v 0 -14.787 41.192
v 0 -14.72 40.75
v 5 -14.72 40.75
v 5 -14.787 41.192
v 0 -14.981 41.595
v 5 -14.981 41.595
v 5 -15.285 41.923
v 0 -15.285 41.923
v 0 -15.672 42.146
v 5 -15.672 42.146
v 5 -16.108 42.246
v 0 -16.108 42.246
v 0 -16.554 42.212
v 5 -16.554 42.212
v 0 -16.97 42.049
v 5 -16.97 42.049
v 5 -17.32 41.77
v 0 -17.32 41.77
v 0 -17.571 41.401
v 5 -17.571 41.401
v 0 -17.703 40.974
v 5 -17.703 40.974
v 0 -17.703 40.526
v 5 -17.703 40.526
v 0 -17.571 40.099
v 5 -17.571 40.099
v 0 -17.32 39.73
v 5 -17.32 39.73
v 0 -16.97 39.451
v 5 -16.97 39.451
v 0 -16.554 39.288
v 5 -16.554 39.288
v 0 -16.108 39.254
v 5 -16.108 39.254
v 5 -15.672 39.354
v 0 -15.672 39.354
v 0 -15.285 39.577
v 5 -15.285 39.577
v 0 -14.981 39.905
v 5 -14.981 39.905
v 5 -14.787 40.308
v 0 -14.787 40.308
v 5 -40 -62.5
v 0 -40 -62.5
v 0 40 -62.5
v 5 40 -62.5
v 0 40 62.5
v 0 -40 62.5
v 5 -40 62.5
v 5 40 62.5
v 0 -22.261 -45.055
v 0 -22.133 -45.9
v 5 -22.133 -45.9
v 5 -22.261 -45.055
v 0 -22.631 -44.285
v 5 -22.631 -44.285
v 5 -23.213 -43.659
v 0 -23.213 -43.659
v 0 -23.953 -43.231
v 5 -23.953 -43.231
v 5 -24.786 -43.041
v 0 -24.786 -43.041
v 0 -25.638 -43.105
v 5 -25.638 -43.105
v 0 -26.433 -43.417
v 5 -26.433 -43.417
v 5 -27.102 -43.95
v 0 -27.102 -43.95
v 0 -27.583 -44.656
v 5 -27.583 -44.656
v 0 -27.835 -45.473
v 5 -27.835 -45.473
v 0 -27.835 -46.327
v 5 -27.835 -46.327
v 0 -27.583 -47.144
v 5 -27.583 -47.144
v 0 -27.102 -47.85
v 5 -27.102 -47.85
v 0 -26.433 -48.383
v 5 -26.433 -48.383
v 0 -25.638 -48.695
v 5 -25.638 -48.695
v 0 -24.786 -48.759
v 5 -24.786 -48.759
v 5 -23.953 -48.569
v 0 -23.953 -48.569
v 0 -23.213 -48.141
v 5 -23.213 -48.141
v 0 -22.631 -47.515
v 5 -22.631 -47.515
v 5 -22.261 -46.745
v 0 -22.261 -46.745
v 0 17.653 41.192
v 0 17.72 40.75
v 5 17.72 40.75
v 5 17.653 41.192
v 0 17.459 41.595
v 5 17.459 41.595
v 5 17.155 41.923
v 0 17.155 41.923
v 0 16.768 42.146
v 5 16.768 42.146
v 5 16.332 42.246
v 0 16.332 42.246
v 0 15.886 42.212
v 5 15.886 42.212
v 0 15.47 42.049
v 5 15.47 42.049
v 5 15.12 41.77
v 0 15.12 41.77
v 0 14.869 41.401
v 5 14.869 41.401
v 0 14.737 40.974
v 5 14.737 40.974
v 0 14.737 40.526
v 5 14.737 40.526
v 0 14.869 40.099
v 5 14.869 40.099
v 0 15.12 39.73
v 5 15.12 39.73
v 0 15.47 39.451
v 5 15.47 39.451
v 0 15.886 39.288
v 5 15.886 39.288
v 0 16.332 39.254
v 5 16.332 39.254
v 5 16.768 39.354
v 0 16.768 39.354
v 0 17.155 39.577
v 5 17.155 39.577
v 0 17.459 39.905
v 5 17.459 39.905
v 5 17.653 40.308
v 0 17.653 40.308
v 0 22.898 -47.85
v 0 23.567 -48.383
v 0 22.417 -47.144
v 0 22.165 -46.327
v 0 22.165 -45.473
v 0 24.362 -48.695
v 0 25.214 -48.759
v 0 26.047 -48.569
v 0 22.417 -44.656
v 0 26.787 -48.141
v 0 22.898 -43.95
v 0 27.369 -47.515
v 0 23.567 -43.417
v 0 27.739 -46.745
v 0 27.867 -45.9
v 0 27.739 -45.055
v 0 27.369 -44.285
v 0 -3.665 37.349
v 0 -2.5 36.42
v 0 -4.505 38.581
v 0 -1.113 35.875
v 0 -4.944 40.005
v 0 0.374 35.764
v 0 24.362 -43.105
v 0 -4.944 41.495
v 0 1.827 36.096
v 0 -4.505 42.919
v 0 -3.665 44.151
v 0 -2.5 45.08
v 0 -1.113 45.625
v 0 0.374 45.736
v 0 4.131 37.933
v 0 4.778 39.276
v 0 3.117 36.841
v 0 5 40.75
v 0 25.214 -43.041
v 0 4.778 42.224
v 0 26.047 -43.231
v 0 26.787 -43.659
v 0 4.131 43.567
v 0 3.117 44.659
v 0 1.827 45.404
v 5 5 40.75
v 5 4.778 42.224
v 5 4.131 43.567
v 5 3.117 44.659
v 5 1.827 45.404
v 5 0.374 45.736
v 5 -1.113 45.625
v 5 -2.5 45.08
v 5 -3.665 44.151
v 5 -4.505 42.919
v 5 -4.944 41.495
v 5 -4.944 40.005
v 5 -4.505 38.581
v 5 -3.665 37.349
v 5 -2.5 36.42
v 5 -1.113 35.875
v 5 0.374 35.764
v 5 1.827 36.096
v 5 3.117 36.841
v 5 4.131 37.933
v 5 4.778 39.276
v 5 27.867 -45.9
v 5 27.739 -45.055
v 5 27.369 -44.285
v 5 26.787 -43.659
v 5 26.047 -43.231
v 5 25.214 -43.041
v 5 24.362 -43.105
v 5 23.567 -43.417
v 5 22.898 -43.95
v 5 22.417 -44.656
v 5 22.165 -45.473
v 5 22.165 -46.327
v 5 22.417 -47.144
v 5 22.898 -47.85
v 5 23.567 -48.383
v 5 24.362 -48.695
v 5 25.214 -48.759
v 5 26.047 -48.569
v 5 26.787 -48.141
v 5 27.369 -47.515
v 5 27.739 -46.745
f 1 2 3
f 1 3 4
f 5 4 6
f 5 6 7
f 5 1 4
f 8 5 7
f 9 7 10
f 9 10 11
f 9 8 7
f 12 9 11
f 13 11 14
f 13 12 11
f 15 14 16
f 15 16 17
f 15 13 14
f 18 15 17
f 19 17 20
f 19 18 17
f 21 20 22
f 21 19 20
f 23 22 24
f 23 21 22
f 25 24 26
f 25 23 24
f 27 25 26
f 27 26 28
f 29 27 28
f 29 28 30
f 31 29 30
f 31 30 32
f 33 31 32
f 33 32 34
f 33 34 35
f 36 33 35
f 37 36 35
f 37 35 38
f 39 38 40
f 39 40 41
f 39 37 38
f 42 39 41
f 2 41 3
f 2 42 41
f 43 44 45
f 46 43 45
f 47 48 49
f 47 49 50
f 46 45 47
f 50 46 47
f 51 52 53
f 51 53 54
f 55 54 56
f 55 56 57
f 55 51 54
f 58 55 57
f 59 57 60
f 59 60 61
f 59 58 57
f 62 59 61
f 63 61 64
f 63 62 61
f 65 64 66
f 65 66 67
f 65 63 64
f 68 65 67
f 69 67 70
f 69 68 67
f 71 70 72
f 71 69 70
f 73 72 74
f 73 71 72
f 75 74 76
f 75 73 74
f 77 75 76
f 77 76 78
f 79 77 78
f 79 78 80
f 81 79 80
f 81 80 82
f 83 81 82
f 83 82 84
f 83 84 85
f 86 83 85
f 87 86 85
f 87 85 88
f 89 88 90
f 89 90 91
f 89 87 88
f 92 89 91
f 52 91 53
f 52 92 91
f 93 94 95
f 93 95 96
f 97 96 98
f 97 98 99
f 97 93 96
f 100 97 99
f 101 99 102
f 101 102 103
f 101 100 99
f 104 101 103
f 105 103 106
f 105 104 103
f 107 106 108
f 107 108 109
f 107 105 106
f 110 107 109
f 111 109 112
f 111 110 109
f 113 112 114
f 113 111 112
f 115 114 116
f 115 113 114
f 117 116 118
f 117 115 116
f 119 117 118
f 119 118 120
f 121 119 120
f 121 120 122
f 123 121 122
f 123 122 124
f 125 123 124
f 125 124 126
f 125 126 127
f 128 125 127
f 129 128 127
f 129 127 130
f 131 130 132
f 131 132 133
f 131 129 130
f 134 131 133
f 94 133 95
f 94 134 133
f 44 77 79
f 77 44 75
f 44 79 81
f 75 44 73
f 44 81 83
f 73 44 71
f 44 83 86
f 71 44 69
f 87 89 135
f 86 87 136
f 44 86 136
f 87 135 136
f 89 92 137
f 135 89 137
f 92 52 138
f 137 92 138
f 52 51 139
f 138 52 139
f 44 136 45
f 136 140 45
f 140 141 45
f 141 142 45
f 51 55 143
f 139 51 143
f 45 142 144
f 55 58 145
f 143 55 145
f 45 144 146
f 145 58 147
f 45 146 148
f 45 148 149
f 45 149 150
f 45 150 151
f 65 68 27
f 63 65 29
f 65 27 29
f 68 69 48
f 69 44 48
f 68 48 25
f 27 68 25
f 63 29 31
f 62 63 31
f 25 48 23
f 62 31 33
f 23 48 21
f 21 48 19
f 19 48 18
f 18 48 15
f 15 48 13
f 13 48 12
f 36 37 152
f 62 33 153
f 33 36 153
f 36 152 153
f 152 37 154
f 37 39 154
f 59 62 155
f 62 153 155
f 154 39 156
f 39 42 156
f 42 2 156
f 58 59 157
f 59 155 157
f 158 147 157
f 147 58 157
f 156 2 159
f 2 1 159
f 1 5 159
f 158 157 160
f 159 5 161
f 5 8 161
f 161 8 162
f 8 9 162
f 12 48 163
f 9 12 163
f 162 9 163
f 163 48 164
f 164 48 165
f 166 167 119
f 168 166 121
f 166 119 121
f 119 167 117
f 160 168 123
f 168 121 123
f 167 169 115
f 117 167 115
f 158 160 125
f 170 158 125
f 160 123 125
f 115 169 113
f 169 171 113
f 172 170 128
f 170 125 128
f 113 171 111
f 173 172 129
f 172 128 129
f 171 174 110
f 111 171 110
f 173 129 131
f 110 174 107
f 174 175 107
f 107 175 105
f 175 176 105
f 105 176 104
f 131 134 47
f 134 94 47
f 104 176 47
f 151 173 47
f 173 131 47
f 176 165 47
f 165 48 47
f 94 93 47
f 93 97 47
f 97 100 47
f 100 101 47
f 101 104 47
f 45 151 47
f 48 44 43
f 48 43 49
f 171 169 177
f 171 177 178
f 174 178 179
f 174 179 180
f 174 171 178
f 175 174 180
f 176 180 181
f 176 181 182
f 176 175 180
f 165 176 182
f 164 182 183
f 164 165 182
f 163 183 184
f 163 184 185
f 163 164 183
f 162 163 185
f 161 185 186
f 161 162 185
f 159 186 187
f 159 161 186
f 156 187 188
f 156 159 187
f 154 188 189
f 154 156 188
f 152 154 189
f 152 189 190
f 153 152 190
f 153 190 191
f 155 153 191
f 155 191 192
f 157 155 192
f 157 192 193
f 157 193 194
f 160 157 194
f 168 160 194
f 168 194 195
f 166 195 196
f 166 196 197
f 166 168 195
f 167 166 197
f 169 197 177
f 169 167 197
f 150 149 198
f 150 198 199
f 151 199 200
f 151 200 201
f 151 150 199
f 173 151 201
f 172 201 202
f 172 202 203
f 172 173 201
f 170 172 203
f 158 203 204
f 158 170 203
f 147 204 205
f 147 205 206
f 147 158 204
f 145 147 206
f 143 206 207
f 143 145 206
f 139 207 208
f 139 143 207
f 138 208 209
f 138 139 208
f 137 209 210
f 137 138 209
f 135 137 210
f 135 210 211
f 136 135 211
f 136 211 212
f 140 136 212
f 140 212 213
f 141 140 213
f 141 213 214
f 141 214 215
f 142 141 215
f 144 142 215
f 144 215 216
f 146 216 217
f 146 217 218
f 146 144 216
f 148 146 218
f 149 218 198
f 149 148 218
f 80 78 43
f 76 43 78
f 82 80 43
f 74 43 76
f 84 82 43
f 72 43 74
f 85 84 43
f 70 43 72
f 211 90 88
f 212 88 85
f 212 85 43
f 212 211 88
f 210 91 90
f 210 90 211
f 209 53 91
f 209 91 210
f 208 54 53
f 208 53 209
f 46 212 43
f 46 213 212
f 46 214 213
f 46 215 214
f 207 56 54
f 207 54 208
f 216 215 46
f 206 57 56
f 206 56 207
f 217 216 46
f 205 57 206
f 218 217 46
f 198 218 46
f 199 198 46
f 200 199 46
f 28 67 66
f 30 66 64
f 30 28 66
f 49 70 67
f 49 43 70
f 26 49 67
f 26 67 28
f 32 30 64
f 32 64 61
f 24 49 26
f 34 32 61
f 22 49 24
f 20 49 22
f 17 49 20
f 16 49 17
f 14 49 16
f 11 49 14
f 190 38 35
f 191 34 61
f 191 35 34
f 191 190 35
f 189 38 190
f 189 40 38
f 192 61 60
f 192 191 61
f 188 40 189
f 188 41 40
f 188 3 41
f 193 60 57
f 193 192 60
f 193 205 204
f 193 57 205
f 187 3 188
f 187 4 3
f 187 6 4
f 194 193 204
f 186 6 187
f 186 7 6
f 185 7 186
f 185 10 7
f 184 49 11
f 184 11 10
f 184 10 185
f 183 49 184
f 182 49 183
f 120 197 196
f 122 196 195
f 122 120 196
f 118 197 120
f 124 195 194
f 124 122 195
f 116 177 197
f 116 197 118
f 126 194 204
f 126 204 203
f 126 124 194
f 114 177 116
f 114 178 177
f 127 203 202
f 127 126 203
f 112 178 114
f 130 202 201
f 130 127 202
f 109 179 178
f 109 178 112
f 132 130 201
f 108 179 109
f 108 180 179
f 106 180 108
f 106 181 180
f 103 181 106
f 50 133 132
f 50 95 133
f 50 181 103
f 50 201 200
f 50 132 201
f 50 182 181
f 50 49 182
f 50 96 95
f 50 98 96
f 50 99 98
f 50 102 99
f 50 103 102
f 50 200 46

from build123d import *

# Parameters (mm, degrees)
SKETCH1_W           = 80
SKETCH1_H           = 125
SKETCH1_R           = 5
SKETCH1_R_2         = 1.5
SKETCH1_R_3         = 2.866822522
BOSS_EXTRUDE1_DEPTH = 5


with BuildPart() as part:
    # Sketch1 → Boss-Extrude1 (new body)
    with BuildSketch(Plane.YZ):
        Rectangle(SKETCH1_W, SKETCH1_H)
        with Locations((0, 40.75)):
            Circle(SKETCH1_R, mode=Mode.SUBTRACT)
        with Locations((-16.22, 40.75)):
            Circle(SKETCH1_R_2, mode=Mode.SUBTRACT)
        with Locations((16.22, 40.75)):
            Circle(SKETCH1_R_2, mode=Mode.SUBTRACT)
        with Locations((-25, -45.9)):
            Circle(SKETCH1_R_3, mode=Mode.SUBTRACT)
        with Locations((25, -45.9)):
            Circle(SKETCH1_R_3, mode=Mode.SUBTRACT)
    extrude(amount=BOSS_EXTRUDE1_DEPTH)


solid = part.part
